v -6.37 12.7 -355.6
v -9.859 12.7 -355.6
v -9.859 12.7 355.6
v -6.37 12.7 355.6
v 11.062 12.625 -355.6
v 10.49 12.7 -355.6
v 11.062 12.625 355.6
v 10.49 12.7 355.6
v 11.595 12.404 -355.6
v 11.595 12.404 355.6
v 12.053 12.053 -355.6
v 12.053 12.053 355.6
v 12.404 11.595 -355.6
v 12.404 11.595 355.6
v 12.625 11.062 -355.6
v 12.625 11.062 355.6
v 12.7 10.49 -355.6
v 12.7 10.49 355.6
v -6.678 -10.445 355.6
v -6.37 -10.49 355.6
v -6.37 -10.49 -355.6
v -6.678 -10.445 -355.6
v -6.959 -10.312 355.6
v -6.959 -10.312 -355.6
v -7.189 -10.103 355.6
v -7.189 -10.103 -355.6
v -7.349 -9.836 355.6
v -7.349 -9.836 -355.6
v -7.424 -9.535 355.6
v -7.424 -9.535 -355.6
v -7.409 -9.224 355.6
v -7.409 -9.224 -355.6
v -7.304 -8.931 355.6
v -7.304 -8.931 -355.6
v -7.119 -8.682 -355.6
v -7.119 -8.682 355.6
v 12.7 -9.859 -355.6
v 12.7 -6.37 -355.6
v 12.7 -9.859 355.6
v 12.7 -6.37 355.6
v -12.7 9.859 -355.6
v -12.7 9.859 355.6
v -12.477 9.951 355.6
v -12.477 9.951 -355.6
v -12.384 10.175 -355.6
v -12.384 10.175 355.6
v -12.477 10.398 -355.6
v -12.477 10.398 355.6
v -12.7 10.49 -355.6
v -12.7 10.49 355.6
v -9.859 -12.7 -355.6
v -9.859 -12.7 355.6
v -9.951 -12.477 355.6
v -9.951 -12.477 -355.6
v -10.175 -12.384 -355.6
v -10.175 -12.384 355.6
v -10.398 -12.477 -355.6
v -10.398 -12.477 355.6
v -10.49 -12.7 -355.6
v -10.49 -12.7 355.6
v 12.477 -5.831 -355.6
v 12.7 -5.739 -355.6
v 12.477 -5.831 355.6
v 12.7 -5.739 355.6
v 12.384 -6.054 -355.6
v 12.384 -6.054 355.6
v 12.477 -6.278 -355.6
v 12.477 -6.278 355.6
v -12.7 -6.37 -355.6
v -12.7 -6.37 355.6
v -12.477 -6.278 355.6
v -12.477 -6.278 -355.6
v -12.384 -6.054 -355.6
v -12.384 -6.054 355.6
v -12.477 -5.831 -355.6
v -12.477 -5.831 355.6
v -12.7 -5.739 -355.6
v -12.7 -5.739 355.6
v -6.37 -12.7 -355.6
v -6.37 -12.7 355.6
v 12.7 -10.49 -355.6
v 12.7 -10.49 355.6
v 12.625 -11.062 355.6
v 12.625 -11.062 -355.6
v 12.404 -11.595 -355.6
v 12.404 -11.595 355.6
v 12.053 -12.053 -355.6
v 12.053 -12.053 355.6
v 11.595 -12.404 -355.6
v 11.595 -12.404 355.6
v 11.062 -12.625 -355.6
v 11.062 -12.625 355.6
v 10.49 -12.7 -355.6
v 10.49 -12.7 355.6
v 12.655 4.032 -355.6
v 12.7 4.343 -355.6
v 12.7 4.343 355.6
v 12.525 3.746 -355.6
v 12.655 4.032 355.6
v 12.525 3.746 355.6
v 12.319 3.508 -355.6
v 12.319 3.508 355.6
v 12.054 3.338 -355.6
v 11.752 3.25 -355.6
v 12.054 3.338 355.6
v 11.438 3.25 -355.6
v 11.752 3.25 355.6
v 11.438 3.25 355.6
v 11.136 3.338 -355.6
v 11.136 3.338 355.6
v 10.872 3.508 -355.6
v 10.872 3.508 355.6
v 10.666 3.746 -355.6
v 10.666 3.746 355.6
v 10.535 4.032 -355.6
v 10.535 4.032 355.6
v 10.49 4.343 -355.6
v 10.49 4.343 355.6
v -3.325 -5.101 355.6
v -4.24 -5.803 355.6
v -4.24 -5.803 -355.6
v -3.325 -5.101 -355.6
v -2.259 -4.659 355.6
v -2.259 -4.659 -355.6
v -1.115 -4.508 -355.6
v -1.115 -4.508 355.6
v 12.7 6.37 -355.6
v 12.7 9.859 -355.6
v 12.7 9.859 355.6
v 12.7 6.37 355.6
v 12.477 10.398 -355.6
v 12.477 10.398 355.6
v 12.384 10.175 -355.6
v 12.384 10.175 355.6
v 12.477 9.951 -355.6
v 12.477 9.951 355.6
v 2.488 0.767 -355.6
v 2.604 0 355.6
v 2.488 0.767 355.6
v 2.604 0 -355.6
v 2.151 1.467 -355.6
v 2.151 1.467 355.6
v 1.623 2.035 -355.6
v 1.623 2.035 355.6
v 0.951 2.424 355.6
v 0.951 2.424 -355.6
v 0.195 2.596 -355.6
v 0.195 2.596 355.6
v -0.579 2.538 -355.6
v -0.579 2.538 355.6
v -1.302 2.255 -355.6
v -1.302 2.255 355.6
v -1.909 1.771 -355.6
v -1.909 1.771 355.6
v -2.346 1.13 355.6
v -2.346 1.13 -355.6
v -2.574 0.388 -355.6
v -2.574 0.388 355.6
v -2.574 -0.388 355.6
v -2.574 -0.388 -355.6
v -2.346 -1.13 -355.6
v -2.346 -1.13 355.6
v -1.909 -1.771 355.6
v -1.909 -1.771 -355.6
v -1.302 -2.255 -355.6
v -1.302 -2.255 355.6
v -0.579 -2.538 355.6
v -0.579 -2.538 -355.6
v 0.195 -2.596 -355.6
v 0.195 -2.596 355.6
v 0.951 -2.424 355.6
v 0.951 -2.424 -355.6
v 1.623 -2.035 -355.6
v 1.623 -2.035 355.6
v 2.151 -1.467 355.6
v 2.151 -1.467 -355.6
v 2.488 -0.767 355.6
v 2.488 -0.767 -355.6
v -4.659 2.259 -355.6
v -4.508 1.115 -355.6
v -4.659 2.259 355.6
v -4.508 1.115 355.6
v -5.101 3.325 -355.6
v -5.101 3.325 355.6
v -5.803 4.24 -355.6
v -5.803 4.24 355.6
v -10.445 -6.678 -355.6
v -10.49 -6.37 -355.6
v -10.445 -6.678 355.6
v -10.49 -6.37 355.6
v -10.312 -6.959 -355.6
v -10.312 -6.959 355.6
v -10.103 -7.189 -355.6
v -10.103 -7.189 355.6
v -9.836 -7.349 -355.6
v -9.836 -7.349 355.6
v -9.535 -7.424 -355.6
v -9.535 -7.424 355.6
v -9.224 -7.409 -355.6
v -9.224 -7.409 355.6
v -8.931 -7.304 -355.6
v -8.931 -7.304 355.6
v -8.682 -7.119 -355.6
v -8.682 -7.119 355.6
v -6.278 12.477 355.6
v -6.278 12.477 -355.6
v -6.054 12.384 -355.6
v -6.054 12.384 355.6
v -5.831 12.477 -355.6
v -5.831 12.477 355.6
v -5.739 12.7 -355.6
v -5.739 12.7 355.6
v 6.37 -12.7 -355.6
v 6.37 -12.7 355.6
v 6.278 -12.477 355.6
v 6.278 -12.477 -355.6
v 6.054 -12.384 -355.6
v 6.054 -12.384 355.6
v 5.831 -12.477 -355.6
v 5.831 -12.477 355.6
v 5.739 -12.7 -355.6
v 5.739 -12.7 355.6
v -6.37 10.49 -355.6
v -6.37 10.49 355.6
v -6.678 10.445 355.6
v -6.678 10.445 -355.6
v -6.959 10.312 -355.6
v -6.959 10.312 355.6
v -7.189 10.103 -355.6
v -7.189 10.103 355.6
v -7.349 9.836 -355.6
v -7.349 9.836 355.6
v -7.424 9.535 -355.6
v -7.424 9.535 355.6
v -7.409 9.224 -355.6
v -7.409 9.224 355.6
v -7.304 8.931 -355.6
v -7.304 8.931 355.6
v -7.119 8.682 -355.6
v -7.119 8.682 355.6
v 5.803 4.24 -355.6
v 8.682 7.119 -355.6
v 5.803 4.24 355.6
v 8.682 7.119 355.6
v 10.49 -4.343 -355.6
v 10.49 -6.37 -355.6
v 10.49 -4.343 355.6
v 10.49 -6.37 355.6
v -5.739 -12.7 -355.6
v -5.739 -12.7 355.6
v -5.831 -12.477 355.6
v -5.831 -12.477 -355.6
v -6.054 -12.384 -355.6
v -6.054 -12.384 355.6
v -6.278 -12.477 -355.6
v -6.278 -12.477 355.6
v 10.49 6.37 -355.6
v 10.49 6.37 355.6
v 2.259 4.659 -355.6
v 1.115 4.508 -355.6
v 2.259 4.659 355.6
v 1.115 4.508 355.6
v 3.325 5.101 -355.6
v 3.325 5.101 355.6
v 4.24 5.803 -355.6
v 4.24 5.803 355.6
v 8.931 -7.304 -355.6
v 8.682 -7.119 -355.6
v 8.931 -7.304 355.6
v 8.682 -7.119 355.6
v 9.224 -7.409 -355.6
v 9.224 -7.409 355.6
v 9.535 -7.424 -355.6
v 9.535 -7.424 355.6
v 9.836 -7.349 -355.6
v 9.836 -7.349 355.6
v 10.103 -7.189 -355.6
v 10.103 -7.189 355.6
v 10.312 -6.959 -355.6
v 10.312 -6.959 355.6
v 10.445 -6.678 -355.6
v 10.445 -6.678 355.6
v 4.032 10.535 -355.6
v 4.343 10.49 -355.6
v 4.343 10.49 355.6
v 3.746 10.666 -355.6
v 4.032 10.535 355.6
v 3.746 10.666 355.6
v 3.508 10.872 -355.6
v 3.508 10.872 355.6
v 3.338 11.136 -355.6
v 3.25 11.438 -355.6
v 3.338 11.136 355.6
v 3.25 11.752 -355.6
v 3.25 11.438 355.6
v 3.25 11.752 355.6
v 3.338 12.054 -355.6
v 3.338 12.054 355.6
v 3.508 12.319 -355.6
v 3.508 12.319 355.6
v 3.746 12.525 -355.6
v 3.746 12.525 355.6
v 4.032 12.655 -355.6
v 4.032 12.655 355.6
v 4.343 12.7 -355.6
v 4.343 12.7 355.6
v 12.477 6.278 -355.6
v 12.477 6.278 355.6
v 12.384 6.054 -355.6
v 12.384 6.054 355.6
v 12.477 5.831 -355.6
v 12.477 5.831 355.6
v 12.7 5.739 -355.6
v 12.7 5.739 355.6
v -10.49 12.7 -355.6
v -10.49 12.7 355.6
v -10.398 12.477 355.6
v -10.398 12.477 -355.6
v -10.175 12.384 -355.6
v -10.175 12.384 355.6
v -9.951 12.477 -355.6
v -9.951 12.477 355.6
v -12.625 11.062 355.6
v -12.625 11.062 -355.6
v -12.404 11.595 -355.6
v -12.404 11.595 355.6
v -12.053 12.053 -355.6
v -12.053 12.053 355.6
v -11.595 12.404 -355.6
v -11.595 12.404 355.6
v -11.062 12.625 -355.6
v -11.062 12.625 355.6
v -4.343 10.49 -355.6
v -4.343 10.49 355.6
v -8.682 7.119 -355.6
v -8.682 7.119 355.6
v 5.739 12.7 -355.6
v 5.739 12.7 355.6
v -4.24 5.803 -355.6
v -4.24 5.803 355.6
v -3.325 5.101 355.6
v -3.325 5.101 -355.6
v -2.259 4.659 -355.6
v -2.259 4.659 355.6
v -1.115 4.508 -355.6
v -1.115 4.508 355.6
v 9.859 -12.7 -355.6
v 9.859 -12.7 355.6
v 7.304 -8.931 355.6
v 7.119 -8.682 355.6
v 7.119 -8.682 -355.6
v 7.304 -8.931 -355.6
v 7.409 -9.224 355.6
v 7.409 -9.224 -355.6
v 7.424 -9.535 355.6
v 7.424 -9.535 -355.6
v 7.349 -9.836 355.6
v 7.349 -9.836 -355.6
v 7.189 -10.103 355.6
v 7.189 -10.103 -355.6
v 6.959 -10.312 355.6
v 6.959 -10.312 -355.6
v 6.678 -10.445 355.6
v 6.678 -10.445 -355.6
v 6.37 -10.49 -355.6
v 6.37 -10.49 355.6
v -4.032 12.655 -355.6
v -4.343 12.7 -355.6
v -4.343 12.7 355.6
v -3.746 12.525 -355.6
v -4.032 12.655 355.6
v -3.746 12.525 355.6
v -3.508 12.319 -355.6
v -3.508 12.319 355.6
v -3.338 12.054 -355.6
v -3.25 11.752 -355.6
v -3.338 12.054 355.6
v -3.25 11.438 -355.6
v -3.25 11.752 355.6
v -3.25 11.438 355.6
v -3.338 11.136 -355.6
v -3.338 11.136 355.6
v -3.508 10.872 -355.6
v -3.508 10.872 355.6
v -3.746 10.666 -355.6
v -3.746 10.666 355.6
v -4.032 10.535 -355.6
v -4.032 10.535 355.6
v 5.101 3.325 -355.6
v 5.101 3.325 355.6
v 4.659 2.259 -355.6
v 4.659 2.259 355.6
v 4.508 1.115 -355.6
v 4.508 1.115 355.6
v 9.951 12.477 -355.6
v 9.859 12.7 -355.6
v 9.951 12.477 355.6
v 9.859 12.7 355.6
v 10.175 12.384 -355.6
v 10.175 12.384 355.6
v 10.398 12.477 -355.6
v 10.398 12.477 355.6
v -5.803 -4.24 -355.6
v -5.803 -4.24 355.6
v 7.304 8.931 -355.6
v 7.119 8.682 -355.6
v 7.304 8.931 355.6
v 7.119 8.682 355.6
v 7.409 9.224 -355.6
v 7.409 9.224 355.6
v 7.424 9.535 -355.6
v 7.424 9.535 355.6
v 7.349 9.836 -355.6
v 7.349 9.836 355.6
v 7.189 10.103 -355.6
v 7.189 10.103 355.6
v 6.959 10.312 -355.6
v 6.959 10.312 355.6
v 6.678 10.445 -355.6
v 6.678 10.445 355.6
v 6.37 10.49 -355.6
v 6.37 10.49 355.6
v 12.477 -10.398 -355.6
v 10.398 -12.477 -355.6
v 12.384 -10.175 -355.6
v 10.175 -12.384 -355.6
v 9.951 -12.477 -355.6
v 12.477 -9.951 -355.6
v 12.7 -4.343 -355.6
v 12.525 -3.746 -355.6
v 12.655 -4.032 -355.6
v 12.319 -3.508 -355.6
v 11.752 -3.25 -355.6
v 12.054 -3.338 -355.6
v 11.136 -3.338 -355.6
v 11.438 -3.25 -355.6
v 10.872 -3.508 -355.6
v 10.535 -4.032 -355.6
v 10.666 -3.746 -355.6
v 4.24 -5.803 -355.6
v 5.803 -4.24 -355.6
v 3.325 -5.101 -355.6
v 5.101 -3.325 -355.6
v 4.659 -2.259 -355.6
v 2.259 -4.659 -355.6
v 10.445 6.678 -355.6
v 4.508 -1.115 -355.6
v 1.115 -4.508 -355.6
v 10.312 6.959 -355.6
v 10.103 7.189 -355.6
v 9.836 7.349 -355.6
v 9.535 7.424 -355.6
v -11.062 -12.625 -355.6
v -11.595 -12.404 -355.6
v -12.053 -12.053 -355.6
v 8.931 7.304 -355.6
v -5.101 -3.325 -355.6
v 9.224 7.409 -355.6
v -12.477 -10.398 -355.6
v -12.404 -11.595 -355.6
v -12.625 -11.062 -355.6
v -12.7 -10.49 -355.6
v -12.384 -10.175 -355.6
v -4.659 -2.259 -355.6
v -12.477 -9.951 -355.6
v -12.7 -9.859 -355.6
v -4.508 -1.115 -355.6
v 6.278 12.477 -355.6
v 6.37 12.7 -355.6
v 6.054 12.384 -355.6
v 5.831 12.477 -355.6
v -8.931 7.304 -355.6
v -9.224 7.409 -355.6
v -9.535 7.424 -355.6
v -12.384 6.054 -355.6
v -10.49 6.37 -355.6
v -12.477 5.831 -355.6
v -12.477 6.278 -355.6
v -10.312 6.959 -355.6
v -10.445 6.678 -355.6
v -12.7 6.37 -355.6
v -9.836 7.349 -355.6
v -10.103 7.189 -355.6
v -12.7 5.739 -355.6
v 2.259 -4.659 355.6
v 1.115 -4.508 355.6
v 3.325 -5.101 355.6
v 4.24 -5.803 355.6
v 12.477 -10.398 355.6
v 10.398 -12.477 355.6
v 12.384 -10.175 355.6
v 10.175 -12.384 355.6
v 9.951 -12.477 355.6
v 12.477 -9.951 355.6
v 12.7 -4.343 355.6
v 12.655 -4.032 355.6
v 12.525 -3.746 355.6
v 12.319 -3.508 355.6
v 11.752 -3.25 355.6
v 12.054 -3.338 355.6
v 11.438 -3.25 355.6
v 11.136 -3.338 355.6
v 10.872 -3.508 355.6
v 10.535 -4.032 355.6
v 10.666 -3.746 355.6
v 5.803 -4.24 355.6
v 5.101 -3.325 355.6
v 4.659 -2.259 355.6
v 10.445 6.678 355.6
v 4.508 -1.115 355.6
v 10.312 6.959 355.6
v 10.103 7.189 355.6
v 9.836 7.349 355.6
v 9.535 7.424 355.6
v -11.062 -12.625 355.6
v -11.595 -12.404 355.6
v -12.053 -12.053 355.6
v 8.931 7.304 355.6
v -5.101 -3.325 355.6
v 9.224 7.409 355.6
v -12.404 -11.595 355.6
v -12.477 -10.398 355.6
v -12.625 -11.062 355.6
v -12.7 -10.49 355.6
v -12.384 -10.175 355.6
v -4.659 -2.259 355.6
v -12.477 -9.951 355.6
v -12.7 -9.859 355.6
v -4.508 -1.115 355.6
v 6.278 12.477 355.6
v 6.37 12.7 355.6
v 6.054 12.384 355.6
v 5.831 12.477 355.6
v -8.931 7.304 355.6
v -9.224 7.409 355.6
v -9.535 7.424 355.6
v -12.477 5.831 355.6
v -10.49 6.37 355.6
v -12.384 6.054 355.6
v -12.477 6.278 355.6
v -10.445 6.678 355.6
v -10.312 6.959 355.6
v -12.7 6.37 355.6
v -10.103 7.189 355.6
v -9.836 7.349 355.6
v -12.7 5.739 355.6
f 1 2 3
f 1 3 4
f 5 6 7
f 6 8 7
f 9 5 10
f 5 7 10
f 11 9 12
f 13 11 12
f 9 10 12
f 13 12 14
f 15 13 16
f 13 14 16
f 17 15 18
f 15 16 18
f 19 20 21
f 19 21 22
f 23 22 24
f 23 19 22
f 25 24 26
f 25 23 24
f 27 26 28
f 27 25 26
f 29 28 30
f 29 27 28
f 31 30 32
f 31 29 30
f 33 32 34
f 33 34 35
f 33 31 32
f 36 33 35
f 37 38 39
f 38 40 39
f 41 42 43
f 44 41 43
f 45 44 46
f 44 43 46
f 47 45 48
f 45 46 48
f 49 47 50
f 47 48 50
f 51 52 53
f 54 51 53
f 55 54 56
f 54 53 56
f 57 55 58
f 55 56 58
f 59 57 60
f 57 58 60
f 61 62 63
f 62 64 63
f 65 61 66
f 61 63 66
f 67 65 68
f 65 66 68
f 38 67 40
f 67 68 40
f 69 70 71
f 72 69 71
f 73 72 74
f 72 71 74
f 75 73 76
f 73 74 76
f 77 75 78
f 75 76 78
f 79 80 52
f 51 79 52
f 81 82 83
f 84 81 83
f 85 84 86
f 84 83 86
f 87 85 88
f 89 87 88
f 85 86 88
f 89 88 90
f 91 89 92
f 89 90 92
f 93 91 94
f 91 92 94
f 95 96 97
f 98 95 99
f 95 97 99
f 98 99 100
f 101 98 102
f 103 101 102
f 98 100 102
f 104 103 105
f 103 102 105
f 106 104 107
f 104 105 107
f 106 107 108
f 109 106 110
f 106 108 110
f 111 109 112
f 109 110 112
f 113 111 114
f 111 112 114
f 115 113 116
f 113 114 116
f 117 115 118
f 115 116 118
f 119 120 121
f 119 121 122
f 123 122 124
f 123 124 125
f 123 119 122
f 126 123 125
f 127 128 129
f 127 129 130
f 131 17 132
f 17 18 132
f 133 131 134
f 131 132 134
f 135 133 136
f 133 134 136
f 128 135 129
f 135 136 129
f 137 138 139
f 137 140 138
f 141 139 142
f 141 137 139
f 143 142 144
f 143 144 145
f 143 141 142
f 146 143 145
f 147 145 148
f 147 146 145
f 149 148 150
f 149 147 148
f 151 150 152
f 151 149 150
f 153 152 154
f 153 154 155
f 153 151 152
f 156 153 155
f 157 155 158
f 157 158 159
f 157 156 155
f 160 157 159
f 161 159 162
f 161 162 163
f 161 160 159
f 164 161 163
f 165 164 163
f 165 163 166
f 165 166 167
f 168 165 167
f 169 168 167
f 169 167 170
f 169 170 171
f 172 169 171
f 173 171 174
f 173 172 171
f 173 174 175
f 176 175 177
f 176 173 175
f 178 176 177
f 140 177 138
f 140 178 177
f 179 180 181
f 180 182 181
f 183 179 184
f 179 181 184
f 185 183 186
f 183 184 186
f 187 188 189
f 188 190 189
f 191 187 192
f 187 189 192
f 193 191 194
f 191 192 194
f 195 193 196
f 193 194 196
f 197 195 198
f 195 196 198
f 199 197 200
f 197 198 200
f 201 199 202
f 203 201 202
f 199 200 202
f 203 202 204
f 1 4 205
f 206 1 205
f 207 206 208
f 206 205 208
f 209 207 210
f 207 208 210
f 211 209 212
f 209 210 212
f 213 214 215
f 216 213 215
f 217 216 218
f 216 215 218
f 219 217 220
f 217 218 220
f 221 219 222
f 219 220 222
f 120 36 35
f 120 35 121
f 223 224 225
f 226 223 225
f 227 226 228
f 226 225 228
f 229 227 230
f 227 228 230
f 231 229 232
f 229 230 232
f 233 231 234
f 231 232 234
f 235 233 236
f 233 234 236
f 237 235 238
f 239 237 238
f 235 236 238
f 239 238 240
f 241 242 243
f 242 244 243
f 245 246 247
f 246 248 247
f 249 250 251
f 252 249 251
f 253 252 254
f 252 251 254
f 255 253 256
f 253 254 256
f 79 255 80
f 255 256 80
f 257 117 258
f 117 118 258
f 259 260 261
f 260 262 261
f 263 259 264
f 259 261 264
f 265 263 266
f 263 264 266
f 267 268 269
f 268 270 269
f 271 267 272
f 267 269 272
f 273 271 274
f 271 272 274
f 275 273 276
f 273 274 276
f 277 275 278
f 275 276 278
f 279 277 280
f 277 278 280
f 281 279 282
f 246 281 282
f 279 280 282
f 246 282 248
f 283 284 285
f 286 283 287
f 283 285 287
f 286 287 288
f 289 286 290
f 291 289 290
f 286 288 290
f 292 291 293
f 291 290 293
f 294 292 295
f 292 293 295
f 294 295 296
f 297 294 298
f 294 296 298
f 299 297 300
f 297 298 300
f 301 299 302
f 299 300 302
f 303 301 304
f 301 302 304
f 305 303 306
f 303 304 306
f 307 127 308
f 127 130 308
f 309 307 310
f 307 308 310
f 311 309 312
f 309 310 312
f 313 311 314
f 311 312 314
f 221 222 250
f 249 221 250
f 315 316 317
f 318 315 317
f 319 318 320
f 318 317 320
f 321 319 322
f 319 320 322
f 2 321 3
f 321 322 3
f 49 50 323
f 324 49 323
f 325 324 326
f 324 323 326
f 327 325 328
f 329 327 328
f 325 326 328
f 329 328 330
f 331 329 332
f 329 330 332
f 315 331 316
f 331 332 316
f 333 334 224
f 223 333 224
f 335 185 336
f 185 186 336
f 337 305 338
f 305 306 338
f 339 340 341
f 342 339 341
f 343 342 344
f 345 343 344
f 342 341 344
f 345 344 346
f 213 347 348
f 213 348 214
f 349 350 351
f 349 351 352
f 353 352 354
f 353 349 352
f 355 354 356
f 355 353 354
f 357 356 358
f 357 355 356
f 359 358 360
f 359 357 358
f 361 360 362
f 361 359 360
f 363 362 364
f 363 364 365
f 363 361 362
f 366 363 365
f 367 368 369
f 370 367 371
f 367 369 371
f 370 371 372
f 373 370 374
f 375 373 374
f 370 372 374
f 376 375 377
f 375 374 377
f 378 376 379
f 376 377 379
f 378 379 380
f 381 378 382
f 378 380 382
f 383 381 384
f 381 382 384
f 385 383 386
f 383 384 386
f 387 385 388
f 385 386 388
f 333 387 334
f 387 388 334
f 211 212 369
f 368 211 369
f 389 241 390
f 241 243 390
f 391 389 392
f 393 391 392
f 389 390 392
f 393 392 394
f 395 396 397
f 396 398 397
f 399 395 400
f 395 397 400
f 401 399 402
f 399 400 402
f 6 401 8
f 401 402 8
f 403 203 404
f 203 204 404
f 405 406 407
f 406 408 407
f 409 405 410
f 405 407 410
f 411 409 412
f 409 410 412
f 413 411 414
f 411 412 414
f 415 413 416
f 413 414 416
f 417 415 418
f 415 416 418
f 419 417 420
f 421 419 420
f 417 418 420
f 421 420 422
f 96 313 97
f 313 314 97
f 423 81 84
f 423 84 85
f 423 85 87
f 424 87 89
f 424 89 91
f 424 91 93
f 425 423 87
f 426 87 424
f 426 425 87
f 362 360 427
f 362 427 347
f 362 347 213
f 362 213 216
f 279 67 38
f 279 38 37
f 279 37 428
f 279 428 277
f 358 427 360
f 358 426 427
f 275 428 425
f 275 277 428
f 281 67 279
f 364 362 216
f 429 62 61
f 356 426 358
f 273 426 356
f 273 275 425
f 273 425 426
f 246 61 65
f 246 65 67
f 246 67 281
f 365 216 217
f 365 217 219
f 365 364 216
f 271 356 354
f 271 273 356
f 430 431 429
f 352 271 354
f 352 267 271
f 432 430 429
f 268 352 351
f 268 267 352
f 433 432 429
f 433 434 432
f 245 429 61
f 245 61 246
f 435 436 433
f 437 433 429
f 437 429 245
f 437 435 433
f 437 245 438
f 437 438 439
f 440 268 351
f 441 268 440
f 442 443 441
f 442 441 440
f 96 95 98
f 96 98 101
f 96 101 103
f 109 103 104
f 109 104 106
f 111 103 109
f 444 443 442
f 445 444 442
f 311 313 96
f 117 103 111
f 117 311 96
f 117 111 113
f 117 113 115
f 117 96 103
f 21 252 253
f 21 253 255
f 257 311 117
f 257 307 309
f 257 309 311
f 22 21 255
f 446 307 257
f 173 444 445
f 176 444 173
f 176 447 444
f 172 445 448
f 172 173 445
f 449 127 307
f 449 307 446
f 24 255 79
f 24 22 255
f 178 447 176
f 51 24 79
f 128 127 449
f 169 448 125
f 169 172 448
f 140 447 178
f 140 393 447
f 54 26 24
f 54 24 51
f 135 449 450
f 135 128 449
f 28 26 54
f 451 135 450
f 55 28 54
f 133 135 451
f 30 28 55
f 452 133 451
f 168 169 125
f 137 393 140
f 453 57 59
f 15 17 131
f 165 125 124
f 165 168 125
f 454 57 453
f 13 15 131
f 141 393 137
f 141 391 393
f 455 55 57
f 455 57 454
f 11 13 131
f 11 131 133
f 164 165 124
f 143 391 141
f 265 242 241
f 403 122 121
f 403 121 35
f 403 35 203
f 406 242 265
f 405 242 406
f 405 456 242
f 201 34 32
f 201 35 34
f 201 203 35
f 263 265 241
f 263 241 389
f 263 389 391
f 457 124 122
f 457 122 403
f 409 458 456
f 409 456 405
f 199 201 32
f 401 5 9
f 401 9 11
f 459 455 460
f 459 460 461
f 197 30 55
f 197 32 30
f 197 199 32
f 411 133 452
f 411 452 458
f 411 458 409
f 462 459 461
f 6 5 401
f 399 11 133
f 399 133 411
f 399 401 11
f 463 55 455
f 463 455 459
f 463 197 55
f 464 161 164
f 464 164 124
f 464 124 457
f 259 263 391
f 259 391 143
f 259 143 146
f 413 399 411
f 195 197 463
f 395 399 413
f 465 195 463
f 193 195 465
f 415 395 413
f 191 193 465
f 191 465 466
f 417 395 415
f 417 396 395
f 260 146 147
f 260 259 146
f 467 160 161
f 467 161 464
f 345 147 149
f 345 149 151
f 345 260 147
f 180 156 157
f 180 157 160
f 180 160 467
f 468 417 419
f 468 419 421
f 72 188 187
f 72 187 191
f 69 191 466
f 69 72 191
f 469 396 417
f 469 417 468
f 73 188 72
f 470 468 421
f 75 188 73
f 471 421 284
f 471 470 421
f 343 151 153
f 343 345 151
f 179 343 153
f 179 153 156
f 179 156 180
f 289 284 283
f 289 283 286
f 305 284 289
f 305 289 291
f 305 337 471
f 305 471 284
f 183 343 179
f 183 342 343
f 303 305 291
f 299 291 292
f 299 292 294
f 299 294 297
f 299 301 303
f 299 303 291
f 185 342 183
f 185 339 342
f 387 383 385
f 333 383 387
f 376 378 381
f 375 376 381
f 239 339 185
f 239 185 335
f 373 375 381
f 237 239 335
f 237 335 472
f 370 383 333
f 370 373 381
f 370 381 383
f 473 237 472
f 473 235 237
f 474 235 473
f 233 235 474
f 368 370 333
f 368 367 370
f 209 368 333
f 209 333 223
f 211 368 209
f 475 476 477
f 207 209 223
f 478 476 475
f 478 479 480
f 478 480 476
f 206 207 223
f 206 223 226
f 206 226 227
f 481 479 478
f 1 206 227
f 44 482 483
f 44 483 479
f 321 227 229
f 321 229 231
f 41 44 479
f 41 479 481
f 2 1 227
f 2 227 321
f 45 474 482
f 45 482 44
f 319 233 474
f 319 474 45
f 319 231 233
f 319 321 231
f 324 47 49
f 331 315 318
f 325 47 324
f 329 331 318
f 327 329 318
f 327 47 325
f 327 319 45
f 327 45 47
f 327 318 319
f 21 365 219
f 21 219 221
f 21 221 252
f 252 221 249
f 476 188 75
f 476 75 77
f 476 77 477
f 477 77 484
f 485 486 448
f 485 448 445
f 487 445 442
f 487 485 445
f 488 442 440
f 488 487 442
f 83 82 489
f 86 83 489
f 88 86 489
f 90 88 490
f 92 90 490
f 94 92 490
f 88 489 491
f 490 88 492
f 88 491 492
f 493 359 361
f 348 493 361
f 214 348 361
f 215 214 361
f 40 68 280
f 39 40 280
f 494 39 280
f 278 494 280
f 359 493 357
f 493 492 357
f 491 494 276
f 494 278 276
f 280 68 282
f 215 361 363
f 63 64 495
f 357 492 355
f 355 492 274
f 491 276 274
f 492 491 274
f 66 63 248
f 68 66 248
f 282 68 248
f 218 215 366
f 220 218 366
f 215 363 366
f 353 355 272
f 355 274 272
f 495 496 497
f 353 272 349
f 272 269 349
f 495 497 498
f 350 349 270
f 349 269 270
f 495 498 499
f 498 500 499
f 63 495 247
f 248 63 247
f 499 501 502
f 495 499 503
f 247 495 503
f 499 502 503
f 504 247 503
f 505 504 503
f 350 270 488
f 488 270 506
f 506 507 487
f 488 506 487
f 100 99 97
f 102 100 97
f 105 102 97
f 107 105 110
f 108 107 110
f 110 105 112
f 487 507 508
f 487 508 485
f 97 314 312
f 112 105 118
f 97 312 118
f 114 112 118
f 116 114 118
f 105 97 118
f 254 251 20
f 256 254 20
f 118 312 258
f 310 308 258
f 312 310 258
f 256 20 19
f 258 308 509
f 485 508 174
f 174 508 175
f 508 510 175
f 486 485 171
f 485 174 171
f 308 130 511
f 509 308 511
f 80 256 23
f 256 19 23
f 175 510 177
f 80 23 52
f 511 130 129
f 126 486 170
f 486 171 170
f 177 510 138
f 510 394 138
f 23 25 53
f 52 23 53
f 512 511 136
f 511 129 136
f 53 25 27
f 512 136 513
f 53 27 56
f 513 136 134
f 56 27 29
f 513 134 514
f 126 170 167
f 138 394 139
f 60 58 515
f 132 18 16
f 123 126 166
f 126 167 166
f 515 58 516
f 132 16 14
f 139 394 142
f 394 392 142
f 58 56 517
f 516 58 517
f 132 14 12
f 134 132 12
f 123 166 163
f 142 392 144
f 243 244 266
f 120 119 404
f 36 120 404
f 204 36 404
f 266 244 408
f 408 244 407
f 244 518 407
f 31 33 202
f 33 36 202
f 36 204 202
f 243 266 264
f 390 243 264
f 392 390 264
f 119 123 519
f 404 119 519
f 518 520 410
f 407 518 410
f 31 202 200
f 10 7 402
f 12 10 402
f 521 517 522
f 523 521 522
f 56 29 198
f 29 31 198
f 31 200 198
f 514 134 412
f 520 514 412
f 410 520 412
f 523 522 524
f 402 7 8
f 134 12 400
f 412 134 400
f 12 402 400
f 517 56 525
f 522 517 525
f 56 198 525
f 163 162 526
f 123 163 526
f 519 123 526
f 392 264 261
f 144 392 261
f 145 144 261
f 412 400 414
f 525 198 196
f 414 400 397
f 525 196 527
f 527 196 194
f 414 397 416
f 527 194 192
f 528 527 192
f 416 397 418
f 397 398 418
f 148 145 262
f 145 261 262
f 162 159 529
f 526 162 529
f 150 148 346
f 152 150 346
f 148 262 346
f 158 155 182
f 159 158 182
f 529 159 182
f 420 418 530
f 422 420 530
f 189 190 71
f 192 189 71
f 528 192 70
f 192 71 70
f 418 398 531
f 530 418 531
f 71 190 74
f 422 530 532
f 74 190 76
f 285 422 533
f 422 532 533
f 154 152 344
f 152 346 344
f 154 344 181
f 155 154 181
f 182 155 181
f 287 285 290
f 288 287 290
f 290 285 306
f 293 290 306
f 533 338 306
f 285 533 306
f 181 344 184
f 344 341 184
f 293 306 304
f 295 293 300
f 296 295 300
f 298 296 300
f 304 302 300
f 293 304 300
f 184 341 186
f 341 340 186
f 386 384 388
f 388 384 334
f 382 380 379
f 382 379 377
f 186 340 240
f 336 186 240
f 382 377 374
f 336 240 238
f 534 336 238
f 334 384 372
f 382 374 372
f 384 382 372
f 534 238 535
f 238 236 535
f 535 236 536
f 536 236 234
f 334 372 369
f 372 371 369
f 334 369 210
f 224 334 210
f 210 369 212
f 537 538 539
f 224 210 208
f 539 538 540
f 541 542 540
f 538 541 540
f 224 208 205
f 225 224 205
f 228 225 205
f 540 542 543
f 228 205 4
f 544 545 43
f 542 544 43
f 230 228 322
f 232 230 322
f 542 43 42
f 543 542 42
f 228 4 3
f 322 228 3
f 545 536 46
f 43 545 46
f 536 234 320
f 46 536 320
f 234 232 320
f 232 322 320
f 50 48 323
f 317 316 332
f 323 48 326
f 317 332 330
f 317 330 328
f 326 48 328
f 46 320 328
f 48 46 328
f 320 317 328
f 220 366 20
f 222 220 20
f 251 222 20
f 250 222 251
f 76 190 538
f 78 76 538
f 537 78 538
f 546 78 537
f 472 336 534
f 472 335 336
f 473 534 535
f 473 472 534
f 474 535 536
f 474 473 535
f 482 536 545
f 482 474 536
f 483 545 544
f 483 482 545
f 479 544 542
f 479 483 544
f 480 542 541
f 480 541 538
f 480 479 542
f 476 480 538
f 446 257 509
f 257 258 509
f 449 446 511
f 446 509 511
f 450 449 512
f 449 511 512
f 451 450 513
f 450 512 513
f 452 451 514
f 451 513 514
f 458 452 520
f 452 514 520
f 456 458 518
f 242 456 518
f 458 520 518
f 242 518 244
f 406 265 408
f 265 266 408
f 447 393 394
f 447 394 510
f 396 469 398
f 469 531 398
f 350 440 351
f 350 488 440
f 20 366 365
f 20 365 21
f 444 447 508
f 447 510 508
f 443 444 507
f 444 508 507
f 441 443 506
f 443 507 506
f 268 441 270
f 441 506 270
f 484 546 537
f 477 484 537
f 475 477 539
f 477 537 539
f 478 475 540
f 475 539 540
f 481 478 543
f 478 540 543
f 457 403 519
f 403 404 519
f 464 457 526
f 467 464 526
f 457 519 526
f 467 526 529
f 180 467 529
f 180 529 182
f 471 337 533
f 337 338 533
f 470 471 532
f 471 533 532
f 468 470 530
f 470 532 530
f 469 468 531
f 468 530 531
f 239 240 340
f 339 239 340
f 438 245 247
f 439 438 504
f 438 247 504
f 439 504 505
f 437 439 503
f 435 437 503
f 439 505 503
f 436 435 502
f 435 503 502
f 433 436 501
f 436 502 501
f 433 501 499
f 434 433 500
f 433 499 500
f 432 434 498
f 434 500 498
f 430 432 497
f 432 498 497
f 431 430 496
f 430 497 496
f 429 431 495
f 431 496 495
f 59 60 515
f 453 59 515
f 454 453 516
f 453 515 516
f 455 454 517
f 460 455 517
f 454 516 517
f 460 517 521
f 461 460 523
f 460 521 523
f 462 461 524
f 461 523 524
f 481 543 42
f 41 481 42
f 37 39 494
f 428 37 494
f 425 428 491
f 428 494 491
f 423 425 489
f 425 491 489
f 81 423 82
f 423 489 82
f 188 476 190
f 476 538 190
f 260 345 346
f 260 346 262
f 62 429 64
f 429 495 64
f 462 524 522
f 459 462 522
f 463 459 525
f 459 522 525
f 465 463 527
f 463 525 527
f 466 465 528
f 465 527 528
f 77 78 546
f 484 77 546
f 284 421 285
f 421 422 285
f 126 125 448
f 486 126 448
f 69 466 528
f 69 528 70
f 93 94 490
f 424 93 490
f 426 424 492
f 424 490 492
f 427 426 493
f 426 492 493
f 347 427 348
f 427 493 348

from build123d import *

# Parameters (mm, degrees)
SKETCH3_R      = 2.6035
EXTRUDE1_DEPTH = 355.6


with BuildPart() as part:
    # Sketch3 → Extrude1 (new, symmetric)
    with BuildSketch(Plane.XY):
        with BuildLine():
            Line((-1.115277175, 4.5085), (1.115277175, 4.5085))
            ThreePointArc((1.115277175, 4.5085), (2.806584872, 4.844922018), (4.240406305, 5.80297087))
            Line((4.240406305, 5.80297087), (7.119225992, 8.681790557))
            ThreePointArc((7.119225992, 8.681790557), (7.348862413, 9.836250802), (6.370158275, 10.4902))
            Line((6.370158275, 10.4902), (4.3434, 10.4902))
            ThreePointArc((4.3434, 10.4902), (3.2385, 11.5951), (4.3434, 12.7))
            Line((4.3434, 12.7), (5.738786846, 12.7))
            ThreePointArc((5.738786846, 12.7), (6.054472561, 12.384314286), (6.370158275, 12.7))
            Line((6.370158275, 12.7), (9.858828571, 12.7))
            ThreePointArc((9.858828571, 12.7), (10.174514286, 12.384314286), (10.4902, 12.7))
            ThreePointArc((10.4902, 12.7), (12.052764565, 12.052764565), (12.7, 10.4902))
            ThreePointArc((12.7, 10.4902), (12.384314286, 10.174514286), (12.7, 9.858828571))
            Line((12.7, 9.858828571), (12.7, 6.370158275))
            ThreePointArc((12.7, 6.370158275), (12.384314286, 6.054472561), (12.7, 5.738786846))
            Line((12.7, 5.738786846), (12.7, 4.3434))
            ThreePointArc((12.7, 4.3434), (11.5951, 3.2385), (10.4902, 4.3434))
            Line((10.4902, 4.3434), (10.4902, 6.370158275))
            ThreePointArc((10.4902, 6.370158275), (9.836250802, 7.348862413), (8.681790557, 7.119225992))
            Line((8.681790557, 7.119225992), (5.80297087, 4.240406305))
            ThreePointArc((5.80297087, 4.240406305), (4.844922018, 2.806584872), (4.5085, 1.115277175))
            Line((4.5085, 1.115277175), (4.5085, -1.115277175))
            ThreePointArc((4.5085, -1.115277175), (4.844922018, -2.806584872), (5.80297087, -4.240406305))
            Line((5.80297087, -4.240406305), (8.681790557, -7.119225992))
            ThreePointArc((8.681790557, -7.119225992), (9.836250802, -7.348862413), (10.4902, -6.370158275))
            Line((10.4902, -6.370158275), (10.4902, -4.3434))
            ThreePointArc((10.4902, -4.3434), (11.5951, -3.2385), (12.7, -4.3434))
            Line((12.7, -4.3434), (12.7, -5.738786846))
            ThreePointArc((12.7, -5.738786846), (12.384314286, -6.054472561), (12.7, -6.370158275))
            Line((12.7, -6.370158275), (12.7, -9.858828571))
            ThreePointArc((12.7, -9.858828571), (12.384314286, -10.174514286), (12.7, -10.4902))
            ThreePointArc((12.7, -10.4902), (12.052764565, -12.052764565), (10.4902, -12.7))
            ThreePointArc((10.4902, -12.7), (10.174514286, -12.384314286), (9.858828571, -12.7))
            Line((9.858828571, -12.7), (6.370158275, -12.7))
            ThreePointArc((6.370158275, -12.7), (6.054472561, -12.384314286), (5.738786846, -12.7))
            Line((5.738786846, -12.7), (4.3434, -12.7))
            Line((4.3434, -12.7), (-5.738786846, -12.7))
            ThreePointArc((-5.738786846, -12.7), (-6.054472561, -12.384314286), (-6.370158275, -12.7))
            Line((-6.370158275, -12.7), (-9.858828571, -12.7))
            ThreePointArc((-9.858828571, -12.7), (-10.174514286, -12.384314286), (-10.4902, -12.7))
            ThreePointArc((-10.4902, -12.7), (-12.052764565, -12.052764565), (-12.7, -10.4902))
            ThreePointArc((-12.7, -10.4902), (-12.384314286, -10.174514286), (-12.7, -9.858828571))
            Line((-12.7, -9.858828571), (-12.7, -6.370158275))
            ThreePointArc((-12.7, -6.370158275), (-12.384314286, -6.054472561), (-12.7, -5.738786846))
            Line((-12.7, -5.738786846), (-12.7, 0))
            Line((-12.7, 0), (-12.7, 5.738786846))
            ThreePointArc((-12.7, 5.738786846), (-12.384314286, 6.054472561), (-12.7, 6.370158275))
            Line((-12.7, 6.370158275), (-12.7, 9.858828571))
            ThreePointArc((-12.7, 9.858828571), (-12.384314286, 10.174514286), (-12.7, 10.4902))
            ThreePointArc((-12.7, 10.4902), (-12.052764565, 12.052764565), (-10.4902, 12.7))
            ThreePointArc((-10.4902, 12.7), (-10.174514286, 12.384314286), (-9.858828571, 12.7))
            Line((-9.858828571, 12.7), (-6.370158275, 12.7))
            ThreePointArc((-6.370158275, 12.7), (-6.054472561, 12.384314286), (-5.738786846, 12.7))
            Line((-5.738786846, 12.7), (-4.3434, 12.7))
            ThreePointArc((-4.3434, 12.7), (-3.2385, 11.5951), (-4.3434, 10.4902))
            Line((-4.3434, 10.4902), (-6.370158275, 10.4902))
            ThreePointArc((-6.370158275, 10.4902), (-7.348862413, 9.836250802), (-7.119225992, 8.681790557))
            Line((-7.119225992, 8.681790557), (-4.240406305, 5.80297087))
            ThreePointArc((-4.240406305, 5.80297087), (-2.806584872, 4.844922018), (-1.115277175, 4.5085))
        make_face()
        Circle(SKETCH3_R, mode=Mode.SUBTRACT)
        with BuildLine():
            Line((-4.5085, -1.115277175), (-4.5085, 1.115277175))
            ThreePointArc((-4.5085, 1.115277175), (-4.844922018, 2.806584872), (-5.80297087, 4.240406305))
            Line((-5.80297087, 4.240406305), (-8.681790557, 7.119225992))
            ThreePointArc((-8.681790557, 7.119225992), (-9.836250802, 7.348862413), (-10.4902, 6.370158275))
            Line((-10.4902, 6.370158275), (-10.4902, 0))
            Line((-10.4902, 0), (-10.4902, -6.370158275))
            ThreePointArc((-10.4902, -6.370158275), (-9.836250802, -7.348862413), (-8.681790557, -7.119225992))
            Line((-8.681790557, -7.119225992), (-5.80297087, -4.240406305))
            ThreePointArc((-5.80297087, -4.240406305), (-4.844922018, -2.806584872), (-4.5085, -1.115277175))
        make_face(mode=Mode.SUBTRACT)
        with BuildLine():
            Line((4.240406305, -5.80297087), (7.119225992, -8.681790557))
            ThreePointArc((7.119225992, -8.681790557), (7.348862413, -9.836250802), (6.370158275, -10.4902))
            Line((6.370158275, -10.4902), (4.3434, -10.4902))
            Line((4.3434, -10.4902), (-6.370158275, -10.4902))
            ThreePointArc((-6.370158275, -10.4902), (-7.348862413, -9.836250802), (-7.119225992, -8.681790557))
            Line((-7.119225992, -8.681790557), (-4.240406305, -5.80297087))
            ThreePointArc((-4.240406305, -5.80297087), (-2.806584872, -4.844922018), (-1.115277175, -4.5085))
            Line((-1.115277175, -4.5085), (1.115277175, -4.5085))
            ThreePointArc((1.115277175, -4.5085), (2.806584872, -4.844922018), (4.240406305, -5.80297087))
        make_face(mode=Mode.SUBTRACT)
    extrude(amount=EXTRUDE1_DEPTH, both=True)


solid = part.part
